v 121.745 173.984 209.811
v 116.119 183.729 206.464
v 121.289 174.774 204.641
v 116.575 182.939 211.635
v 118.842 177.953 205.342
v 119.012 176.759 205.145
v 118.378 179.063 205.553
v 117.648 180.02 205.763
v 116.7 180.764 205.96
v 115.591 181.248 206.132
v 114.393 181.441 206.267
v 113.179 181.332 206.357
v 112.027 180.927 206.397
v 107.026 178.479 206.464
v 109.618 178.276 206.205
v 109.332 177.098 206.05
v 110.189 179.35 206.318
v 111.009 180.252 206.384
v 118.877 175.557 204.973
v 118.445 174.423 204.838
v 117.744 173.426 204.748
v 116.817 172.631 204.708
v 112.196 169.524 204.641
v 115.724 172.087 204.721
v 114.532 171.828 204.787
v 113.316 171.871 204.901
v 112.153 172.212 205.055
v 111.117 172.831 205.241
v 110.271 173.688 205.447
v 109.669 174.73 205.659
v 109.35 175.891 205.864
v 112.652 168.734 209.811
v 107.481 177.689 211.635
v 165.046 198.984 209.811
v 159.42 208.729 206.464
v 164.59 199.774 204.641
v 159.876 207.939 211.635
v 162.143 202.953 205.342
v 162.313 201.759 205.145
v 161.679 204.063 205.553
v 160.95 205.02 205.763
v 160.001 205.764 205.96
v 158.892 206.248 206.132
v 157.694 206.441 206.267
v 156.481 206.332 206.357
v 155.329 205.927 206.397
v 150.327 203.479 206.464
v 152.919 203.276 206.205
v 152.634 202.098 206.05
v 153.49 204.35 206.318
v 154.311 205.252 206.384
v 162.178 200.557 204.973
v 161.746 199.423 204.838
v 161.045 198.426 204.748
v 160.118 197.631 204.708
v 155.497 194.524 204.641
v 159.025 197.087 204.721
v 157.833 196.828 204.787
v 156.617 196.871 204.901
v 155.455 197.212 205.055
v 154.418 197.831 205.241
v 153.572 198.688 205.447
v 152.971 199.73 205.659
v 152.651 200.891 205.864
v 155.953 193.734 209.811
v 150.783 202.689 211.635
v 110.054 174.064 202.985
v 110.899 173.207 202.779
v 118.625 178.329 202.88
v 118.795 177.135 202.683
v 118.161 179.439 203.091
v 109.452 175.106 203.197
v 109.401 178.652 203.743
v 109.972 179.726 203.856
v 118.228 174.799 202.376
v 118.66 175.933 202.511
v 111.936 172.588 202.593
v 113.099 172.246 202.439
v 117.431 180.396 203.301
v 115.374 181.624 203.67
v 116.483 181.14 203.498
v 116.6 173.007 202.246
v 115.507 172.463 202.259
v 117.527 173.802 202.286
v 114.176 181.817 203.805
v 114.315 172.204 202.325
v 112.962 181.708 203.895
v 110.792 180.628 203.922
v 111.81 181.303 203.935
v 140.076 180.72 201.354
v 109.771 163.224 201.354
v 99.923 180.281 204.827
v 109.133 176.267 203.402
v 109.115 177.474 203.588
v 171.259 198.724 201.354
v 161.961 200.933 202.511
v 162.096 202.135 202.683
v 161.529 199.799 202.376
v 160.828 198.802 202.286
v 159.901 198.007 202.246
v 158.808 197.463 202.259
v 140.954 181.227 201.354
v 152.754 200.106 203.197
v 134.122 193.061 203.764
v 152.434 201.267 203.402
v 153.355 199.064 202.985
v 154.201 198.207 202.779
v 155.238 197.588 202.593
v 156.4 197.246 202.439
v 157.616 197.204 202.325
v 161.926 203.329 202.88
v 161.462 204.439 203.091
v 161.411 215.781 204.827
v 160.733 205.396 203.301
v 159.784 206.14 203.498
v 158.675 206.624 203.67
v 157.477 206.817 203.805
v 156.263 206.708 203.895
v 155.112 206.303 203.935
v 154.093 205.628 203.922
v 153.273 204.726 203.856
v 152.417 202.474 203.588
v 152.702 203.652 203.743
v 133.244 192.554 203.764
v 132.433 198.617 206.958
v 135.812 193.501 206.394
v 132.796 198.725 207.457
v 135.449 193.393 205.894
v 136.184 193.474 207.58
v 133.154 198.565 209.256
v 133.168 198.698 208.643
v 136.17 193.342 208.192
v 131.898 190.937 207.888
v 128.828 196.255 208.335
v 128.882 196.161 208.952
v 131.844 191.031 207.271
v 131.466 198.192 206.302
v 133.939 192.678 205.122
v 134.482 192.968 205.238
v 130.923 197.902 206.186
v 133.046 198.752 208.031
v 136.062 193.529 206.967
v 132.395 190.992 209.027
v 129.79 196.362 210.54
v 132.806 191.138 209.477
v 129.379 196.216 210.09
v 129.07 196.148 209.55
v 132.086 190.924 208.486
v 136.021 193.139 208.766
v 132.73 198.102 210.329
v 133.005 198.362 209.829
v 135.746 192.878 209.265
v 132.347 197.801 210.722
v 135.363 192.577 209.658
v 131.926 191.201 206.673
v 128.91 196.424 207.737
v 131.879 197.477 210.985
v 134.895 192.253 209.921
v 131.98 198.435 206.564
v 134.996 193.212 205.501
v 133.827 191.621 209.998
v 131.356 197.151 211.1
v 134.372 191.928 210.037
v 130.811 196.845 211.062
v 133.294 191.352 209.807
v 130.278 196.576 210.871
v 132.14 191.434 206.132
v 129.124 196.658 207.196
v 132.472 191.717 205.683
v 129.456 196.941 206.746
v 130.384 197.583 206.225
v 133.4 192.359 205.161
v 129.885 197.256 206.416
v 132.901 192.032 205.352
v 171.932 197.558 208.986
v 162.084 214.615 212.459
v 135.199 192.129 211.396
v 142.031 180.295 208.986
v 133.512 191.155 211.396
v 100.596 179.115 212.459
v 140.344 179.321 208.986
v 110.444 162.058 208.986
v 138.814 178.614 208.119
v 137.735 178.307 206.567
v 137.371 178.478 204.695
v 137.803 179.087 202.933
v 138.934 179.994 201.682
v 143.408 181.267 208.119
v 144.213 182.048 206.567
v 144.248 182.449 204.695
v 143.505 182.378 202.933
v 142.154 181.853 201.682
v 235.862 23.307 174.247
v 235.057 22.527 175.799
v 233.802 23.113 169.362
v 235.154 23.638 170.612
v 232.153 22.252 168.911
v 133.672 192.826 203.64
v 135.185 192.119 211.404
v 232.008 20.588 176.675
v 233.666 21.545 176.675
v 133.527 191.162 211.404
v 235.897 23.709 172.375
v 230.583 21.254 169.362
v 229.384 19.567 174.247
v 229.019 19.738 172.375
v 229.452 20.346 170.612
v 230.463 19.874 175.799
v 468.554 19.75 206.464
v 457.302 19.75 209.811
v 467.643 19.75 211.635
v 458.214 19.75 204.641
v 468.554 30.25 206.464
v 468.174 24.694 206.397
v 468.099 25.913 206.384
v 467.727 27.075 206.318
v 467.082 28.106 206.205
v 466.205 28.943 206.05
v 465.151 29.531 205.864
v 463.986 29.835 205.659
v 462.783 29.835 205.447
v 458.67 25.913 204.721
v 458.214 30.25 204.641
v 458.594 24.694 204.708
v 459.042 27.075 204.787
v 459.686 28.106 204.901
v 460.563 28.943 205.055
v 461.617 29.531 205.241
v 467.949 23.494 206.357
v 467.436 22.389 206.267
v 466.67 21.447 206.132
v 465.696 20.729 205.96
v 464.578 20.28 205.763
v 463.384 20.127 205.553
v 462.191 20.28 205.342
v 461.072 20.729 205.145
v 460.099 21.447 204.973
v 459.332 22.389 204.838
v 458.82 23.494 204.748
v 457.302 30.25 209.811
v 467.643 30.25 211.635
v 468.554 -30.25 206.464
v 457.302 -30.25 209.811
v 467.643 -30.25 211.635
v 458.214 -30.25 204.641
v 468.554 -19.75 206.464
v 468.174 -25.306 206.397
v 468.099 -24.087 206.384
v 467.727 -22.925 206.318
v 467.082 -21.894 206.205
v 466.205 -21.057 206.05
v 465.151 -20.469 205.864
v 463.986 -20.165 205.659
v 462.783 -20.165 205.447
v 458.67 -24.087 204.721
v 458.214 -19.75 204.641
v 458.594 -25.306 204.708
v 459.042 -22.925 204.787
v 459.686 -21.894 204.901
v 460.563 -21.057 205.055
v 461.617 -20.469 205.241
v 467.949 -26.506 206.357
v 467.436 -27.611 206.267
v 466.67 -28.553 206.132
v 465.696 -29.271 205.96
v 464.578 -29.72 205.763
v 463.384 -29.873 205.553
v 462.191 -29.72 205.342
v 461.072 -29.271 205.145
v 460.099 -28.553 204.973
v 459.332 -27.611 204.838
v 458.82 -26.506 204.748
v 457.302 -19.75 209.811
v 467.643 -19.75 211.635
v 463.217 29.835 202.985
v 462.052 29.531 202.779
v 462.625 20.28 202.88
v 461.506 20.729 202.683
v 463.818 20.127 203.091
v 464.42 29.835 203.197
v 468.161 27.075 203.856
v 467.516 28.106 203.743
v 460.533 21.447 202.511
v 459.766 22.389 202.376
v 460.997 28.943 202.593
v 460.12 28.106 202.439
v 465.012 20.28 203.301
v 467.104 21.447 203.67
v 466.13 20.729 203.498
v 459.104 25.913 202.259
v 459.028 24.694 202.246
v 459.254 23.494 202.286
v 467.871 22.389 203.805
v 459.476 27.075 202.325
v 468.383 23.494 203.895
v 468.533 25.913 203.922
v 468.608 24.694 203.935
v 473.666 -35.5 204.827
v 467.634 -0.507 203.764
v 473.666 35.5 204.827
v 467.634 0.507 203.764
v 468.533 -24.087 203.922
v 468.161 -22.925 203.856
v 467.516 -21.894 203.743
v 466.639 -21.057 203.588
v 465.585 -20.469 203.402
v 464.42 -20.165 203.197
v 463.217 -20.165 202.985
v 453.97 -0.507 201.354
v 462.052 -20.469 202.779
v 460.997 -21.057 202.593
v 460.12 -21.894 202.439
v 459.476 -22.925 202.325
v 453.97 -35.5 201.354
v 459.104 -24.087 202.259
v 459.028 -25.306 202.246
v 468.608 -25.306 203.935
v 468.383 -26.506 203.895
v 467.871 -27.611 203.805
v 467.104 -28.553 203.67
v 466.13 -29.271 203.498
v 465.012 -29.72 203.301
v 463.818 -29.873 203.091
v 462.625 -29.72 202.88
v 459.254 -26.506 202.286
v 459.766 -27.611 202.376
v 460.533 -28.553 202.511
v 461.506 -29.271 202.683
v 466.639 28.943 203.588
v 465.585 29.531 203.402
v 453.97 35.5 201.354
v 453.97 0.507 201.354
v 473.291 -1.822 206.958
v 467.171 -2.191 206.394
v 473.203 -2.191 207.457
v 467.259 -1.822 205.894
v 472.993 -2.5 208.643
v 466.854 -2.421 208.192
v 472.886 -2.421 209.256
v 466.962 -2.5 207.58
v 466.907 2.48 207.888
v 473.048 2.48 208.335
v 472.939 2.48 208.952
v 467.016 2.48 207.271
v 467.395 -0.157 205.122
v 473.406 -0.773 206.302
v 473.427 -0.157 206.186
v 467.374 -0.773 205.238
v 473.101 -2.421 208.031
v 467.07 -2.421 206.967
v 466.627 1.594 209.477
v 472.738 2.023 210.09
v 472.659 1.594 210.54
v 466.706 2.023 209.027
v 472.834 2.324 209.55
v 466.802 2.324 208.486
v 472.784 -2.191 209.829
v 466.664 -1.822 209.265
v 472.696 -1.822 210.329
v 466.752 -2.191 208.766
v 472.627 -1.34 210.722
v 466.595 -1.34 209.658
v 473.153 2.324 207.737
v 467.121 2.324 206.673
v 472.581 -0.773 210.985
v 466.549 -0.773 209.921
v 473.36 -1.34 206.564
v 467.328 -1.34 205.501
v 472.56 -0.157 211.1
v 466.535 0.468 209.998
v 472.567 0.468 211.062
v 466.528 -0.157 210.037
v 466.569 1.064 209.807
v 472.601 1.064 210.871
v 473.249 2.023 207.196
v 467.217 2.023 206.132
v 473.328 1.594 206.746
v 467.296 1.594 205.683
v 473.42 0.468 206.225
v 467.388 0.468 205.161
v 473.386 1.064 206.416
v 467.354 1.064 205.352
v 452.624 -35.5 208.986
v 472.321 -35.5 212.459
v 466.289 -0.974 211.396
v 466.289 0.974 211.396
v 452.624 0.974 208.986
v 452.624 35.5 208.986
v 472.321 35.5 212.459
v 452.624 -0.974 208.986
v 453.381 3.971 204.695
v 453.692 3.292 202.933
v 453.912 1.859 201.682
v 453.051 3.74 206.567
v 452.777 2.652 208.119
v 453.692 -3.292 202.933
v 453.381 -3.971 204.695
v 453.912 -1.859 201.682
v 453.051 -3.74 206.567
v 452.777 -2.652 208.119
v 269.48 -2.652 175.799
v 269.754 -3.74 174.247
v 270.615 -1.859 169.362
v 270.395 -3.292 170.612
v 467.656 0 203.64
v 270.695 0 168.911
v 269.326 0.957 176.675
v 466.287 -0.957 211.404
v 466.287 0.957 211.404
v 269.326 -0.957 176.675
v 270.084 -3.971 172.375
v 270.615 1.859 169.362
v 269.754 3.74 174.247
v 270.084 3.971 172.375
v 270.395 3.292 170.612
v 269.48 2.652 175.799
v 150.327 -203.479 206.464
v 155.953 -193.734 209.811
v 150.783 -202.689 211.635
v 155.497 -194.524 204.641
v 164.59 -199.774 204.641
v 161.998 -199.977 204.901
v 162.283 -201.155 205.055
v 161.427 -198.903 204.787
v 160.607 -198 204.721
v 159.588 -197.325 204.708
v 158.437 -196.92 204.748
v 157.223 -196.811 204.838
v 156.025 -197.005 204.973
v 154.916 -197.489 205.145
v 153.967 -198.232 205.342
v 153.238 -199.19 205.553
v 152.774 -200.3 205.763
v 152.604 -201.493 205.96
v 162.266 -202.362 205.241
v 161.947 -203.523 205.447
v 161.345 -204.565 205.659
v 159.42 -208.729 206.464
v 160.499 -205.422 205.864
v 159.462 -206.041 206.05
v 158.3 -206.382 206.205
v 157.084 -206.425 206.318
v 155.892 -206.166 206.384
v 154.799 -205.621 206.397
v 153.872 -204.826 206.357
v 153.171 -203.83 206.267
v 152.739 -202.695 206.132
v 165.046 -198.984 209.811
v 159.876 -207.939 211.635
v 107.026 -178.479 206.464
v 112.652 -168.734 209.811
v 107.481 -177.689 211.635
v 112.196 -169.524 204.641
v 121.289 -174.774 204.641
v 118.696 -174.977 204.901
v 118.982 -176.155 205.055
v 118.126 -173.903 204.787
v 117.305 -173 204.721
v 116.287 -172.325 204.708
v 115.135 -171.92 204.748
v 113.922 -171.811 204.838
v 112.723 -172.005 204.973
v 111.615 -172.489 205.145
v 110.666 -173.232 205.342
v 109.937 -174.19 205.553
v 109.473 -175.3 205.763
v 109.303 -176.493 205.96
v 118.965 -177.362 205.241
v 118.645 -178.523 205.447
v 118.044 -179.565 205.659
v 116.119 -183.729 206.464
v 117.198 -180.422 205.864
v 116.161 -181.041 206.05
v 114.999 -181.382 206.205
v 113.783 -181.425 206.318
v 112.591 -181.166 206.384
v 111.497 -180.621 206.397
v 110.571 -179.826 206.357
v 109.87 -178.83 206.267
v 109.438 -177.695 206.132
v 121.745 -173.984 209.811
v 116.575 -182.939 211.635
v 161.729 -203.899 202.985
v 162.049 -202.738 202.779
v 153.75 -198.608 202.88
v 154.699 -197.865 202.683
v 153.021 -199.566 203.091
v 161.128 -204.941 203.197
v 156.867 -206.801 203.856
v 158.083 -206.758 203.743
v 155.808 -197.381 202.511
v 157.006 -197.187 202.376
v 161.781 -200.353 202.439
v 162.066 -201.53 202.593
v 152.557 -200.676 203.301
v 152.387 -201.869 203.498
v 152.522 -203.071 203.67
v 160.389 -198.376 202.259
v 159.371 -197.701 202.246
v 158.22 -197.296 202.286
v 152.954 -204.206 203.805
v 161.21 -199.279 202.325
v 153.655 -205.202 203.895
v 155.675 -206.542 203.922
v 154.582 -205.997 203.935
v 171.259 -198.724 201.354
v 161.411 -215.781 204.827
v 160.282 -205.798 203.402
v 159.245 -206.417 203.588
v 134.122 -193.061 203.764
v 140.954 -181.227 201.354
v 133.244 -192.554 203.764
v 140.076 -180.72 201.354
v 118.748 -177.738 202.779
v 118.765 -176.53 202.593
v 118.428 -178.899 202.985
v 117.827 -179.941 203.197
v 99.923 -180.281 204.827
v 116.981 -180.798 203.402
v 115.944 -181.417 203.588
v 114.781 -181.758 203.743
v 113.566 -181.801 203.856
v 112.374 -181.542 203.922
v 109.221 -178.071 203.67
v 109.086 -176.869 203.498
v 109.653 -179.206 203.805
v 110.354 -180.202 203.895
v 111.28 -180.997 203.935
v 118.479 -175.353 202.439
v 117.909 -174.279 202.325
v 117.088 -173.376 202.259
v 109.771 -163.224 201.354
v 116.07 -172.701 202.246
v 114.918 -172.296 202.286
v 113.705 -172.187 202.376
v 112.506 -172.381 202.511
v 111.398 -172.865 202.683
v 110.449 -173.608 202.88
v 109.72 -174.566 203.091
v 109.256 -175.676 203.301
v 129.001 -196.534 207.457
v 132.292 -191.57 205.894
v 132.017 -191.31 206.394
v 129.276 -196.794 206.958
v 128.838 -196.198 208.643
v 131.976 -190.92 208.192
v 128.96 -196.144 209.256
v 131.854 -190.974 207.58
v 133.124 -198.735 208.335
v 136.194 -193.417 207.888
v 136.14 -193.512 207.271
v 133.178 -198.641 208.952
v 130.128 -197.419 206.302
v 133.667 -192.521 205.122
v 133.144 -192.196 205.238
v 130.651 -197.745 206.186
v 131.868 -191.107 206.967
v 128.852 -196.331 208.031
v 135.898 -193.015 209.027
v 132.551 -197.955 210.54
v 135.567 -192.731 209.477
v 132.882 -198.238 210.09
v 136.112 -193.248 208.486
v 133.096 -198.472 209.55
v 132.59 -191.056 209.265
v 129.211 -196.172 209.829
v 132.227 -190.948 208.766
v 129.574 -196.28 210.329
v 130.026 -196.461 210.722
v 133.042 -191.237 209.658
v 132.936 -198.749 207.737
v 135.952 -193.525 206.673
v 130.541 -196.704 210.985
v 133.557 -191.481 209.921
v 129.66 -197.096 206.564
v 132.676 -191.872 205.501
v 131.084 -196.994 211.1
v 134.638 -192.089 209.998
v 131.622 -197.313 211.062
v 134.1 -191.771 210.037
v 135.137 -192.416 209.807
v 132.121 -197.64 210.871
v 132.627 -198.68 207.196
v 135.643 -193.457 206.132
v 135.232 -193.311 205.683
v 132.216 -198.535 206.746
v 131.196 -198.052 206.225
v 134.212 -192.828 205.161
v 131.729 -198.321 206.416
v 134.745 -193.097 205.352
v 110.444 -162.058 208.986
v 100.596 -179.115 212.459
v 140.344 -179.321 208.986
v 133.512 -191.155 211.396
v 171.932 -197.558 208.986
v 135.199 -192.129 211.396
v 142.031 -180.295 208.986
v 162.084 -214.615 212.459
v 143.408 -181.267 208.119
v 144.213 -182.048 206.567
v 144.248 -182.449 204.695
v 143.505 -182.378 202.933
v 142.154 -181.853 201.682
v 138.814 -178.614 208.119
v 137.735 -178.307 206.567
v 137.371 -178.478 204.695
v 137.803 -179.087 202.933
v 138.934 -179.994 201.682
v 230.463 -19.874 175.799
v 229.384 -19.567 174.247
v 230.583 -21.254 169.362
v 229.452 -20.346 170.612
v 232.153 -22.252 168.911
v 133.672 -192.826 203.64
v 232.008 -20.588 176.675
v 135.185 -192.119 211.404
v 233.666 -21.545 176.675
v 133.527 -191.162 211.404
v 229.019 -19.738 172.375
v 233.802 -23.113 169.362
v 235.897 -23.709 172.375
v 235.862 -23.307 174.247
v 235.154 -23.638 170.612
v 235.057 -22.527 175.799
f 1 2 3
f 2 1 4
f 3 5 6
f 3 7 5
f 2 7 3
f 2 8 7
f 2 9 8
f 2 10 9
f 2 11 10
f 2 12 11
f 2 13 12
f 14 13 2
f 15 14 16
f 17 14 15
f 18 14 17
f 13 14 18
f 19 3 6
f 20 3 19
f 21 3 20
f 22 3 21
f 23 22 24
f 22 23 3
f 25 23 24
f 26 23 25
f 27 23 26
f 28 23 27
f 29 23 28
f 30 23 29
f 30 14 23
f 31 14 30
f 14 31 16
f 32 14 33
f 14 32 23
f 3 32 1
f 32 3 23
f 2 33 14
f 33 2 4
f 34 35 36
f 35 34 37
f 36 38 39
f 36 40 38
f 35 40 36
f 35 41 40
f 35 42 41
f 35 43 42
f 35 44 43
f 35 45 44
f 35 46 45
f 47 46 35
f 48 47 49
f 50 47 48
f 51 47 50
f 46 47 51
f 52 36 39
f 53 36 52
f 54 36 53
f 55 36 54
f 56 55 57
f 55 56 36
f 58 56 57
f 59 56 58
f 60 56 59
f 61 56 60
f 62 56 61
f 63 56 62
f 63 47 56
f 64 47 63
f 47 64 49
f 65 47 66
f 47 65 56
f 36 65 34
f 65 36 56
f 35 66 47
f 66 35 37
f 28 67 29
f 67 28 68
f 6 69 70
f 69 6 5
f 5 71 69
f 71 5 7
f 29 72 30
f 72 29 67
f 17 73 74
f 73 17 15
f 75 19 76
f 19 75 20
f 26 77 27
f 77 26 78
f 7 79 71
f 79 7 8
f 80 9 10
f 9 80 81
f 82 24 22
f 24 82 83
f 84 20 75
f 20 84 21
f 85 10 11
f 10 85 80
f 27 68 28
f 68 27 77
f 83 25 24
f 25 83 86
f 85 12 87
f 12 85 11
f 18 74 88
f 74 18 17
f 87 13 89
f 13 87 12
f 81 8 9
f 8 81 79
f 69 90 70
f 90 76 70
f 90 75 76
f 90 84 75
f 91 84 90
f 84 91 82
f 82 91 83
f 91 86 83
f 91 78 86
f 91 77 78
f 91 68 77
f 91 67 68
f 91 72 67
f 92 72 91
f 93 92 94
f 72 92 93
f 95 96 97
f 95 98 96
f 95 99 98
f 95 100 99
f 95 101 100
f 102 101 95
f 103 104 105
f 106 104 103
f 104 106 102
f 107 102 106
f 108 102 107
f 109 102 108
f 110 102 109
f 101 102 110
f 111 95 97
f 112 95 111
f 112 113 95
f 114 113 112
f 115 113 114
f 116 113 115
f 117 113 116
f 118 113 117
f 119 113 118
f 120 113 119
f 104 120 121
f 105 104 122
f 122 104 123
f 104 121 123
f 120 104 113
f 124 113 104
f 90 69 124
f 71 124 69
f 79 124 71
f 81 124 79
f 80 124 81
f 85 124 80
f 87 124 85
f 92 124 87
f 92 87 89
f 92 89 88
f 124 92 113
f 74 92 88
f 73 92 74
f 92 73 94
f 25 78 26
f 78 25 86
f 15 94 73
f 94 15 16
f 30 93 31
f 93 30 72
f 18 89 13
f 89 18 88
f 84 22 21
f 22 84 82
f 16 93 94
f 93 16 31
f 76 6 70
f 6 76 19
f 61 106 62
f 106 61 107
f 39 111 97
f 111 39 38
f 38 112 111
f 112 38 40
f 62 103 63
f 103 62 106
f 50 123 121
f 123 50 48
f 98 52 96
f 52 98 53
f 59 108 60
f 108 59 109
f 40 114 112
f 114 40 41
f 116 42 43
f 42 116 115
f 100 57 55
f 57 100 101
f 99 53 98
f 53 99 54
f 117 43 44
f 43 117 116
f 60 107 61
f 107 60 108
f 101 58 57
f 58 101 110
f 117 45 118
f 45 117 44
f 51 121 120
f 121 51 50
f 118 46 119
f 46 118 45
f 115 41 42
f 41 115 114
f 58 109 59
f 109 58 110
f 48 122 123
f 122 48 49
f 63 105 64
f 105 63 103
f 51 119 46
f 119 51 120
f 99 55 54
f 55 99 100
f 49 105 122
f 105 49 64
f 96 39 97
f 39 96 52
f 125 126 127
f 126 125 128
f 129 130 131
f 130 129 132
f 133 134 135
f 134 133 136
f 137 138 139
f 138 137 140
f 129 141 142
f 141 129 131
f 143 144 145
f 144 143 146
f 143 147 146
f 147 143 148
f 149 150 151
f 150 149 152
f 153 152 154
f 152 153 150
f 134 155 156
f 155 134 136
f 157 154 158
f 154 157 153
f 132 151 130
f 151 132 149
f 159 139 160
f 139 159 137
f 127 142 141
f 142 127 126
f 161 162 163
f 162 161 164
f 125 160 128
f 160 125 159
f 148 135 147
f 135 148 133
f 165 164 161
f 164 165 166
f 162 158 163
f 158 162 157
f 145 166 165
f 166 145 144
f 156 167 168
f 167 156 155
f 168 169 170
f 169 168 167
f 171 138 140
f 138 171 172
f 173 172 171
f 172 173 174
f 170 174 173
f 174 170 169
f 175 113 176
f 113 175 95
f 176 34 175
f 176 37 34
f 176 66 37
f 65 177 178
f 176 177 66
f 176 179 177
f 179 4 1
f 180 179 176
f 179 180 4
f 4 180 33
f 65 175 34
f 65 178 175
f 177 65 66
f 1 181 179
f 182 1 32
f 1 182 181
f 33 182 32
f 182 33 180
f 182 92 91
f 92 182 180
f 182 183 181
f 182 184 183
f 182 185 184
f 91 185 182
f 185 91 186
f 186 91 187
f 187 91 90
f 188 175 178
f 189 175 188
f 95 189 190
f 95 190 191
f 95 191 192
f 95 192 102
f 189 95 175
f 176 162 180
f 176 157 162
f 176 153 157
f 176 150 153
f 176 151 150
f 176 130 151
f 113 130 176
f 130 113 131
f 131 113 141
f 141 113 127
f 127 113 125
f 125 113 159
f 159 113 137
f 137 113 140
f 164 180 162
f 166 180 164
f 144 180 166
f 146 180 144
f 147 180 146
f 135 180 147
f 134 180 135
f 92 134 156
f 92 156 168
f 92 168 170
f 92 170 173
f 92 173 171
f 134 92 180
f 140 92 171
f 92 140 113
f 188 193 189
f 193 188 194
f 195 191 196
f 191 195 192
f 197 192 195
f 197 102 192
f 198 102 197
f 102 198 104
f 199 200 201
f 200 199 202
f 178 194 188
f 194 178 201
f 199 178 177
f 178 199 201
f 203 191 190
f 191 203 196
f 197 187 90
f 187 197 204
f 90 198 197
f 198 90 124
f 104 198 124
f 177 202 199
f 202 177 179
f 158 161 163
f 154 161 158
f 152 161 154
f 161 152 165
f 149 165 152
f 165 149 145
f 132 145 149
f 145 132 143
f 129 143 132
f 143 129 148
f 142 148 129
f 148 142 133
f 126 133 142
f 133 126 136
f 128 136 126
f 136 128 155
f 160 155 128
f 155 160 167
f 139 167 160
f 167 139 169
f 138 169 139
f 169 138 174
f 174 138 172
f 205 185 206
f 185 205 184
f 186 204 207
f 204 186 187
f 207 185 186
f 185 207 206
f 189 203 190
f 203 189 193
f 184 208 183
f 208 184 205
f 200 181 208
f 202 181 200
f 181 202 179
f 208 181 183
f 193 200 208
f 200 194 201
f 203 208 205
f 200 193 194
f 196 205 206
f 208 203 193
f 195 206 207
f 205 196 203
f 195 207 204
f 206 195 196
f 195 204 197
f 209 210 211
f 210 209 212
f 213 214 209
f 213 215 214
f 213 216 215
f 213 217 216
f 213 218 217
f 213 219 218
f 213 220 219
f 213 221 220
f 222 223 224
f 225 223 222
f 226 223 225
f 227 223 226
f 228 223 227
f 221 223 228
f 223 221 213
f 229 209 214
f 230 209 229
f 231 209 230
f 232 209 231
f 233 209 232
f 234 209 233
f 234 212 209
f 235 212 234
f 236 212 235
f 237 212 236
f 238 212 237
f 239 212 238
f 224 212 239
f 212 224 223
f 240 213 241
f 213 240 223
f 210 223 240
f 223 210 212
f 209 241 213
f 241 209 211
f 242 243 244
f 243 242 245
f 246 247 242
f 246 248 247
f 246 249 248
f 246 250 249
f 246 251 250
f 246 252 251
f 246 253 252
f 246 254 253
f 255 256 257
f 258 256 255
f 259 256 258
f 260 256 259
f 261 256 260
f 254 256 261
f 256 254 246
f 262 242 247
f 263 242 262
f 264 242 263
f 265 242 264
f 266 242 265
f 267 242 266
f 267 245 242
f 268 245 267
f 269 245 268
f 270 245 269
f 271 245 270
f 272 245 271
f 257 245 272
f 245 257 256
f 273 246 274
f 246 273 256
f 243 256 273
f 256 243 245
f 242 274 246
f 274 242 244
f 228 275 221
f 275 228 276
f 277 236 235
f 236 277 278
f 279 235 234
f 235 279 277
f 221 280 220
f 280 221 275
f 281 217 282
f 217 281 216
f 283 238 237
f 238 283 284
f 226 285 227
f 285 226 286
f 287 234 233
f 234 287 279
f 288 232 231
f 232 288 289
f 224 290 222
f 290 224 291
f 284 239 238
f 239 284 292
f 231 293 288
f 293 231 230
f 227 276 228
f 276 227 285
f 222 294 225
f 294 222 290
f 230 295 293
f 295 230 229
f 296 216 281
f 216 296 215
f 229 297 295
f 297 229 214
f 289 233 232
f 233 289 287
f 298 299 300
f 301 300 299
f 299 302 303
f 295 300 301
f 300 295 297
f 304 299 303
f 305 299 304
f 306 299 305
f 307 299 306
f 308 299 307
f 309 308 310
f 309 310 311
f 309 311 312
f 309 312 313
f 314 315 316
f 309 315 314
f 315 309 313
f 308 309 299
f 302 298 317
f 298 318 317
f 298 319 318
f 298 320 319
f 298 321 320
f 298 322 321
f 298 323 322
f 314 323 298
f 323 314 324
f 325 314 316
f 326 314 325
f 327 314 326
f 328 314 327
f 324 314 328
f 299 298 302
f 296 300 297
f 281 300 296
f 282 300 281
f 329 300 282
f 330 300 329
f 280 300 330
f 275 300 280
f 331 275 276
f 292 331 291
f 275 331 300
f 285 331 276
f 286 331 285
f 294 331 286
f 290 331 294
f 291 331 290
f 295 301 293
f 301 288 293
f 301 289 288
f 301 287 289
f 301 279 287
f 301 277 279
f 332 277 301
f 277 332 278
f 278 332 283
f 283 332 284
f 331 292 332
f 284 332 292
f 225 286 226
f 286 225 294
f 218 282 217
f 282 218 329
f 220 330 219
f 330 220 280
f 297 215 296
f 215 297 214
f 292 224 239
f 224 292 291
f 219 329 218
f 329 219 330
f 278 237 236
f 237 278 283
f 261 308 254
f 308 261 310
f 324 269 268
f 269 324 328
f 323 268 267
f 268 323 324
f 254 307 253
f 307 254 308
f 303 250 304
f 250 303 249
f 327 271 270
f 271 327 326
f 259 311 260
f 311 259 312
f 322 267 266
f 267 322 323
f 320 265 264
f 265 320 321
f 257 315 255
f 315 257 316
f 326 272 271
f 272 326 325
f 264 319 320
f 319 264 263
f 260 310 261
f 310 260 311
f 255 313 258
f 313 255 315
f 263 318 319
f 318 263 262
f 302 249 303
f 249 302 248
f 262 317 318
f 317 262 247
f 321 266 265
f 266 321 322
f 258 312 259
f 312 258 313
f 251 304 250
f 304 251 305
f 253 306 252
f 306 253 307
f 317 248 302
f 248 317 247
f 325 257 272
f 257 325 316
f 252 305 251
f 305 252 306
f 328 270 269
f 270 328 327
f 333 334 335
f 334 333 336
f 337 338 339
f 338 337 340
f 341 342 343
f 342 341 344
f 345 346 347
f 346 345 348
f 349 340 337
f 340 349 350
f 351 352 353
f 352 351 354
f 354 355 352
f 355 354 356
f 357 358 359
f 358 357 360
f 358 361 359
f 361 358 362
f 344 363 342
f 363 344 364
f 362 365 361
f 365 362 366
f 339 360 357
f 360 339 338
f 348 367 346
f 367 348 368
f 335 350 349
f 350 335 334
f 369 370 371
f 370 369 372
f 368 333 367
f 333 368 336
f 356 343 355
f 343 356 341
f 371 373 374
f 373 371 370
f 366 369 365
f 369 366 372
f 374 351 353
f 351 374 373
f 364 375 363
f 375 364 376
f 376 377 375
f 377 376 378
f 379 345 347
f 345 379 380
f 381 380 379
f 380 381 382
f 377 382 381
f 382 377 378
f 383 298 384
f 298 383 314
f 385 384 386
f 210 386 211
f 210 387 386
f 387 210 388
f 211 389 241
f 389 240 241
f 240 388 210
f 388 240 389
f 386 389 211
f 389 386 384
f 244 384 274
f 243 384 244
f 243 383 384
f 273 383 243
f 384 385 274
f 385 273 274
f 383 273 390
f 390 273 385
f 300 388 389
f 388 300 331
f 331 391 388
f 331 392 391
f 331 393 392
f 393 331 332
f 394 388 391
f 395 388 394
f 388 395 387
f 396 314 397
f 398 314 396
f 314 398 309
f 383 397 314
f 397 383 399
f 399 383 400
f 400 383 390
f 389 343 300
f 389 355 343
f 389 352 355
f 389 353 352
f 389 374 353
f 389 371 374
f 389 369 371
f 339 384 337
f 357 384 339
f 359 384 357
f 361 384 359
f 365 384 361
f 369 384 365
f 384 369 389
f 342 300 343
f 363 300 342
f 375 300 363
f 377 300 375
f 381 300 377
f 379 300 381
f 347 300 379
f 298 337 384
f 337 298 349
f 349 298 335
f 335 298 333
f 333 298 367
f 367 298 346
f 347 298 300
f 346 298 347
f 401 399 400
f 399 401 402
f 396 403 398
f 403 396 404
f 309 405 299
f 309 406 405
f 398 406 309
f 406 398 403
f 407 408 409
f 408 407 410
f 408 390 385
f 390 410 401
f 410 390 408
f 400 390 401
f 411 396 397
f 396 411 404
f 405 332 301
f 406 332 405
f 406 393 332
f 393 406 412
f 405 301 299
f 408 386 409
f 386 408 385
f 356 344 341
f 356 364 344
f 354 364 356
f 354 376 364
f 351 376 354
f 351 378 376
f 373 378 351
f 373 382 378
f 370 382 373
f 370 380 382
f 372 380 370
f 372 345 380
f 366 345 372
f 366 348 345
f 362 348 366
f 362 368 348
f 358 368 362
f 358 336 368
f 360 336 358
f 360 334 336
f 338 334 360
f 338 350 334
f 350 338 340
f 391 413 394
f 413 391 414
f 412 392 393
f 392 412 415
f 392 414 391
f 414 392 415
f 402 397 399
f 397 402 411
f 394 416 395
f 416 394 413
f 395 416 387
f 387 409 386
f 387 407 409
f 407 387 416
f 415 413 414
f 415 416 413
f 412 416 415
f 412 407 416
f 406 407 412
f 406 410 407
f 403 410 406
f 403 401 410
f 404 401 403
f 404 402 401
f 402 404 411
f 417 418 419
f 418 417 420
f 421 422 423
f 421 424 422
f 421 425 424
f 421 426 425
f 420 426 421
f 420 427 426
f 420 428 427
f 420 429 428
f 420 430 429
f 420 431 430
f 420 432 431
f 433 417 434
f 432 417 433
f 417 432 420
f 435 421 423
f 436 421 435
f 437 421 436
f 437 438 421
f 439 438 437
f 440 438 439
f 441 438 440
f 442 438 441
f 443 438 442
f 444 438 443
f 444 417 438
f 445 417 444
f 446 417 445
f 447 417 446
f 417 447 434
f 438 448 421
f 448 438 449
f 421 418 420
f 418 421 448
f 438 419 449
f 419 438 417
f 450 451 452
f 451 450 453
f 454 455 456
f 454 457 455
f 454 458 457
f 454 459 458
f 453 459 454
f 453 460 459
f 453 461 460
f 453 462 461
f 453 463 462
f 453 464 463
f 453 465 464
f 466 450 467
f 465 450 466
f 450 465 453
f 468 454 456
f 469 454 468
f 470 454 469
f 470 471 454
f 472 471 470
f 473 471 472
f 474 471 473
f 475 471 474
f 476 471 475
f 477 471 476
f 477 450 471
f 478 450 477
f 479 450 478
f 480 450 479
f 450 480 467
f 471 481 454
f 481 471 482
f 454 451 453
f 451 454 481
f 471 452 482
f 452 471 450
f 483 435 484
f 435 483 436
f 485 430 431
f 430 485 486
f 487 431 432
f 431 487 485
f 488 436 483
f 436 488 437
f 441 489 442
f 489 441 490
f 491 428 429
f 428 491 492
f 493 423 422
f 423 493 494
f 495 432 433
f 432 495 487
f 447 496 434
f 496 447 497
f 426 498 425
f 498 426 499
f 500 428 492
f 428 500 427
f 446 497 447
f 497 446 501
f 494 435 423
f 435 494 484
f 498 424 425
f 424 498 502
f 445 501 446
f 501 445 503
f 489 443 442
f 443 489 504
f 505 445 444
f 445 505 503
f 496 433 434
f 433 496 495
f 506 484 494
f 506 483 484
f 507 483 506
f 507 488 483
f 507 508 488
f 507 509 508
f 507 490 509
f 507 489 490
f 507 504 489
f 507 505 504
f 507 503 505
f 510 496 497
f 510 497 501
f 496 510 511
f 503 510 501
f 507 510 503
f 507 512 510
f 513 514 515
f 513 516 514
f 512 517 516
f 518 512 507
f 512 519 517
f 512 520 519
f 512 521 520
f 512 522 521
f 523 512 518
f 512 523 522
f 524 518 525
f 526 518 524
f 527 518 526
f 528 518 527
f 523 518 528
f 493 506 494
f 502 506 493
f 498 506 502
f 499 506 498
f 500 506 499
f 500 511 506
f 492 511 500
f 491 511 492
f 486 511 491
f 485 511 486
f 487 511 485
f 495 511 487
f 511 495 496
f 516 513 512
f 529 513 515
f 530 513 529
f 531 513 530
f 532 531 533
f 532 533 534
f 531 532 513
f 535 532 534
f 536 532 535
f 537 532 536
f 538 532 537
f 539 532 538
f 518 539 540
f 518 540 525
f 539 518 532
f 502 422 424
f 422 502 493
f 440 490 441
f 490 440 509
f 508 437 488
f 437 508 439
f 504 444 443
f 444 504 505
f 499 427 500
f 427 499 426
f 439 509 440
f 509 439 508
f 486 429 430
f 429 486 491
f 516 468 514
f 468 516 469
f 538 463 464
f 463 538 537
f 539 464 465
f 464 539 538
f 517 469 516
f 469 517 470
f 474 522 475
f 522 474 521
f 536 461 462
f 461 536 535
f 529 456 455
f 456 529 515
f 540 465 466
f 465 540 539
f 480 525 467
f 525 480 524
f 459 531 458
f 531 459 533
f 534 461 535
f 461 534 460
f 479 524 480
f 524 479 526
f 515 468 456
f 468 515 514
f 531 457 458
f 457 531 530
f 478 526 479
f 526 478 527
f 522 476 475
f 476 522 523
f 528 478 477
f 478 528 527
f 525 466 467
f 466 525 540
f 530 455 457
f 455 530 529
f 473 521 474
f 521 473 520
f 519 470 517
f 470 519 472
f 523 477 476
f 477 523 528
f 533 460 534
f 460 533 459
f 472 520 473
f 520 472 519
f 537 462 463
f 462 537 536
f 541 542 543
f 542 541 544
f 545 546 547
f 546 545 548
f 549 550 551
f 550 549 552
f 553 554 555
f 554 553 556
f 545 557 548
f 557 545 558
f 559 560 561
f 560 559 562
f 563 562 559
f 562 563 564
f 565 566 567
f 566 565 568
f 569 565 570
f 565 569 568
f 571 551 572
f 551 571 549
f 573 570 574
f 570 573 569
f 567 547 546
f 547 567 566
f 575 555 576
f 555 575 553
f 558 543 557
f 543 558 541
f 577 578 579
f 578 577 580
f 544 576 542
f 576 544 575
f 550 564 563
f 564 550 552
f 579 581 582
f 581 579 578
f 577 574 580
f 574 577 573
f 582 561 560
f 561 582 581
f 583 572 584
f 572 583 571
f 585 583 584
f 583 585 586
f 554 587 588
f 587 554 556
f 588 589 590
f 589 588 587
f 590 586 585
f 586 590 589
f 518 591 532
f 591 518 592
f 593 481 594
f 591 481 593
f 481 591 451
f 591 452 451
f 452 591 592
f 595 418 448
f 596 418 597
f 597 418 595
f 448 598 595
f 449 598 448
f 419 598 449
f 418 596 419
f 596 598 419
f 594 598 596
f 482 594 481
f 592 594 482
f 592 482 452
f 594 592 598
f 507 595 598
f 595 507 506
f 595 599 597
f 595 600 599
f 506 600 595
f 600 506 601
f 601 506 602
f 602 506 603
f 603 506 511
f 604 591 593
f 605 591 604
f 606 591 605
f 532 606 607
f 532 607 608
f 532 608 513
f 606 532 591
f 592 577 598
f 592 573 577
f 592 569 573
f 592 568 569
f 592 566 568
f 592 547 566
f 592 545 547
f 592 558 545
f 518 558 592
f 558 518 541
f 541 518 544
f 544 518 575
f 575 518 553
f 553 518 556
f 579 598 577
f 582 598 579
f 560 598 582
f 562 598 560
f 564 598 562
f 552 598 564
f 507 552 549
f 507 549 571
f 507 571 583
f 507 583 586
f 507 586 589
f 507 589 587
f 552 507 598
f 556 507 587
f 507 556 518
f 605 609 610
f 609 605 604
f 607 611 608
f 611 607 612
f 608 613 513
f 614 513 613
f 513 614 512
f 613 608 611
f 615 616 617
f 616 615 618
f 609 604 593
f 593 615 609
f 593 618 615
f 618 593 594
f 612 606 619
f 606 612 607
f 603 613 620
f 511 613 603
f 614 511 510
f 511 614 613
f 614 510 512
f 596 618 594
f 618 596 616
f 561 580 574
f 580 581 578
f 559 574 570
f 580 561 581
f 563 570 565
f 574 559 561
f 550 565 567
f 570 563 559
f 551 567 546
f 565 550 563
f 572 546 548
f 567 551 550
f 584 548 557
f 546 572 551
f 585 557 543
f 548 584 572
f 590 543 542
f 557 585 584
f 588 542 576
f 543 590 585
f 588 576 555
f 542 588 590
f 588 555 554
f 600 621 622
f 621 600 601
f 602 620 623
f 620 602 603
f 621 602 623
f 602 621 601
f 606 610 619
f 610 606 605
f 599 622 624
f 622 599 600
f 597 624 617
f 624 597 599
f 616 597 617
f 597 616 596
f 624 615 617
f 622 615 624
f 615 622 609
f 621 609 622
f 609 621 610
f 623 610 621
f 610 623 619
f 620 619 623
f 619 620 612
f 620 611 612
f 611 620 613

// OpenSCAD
// file: variables.scad
// Pinya3 3D Food Printer
// file: variables.scad 
// author: Luis Rodriguez
// version: 0.1
// w3b: 3digitalcooks.com 

// Variables for all the project
// just numbers??
alpha = 0.7;

// FRAME 
frame_alpha = alpha;
frame_profile_width = 20;

frame_height = 410;
frame_width = 200;  // 250mm -> 7capsules~de 8cm
frame_lenght = 200;

// PRINTING AREA
// from: https://www.marginallyclever.com/other/samples/fk-ik-test.html
// Base radius (f) = 80mm
// End Effector radius (e) = 30mm
// Bice length (rf) = 200mm
// Forearm length = 260mm
// PA = 260 x 260 x 260
// X=-128.225 to 128.225 mm 
// Y=-128.225 to 128.225 mm
// Z=-387.23 to -130.781 mm
printing_area_alpha = 0.1;
printing_area_x = 128*2;//195*2;
printing_area_y = 128*2;//195*2;
printing_area_distance_from_motors_base = 130;//151
printing_area_z_max = 387;
printing_area_z = printing_area_z_max - printing_area_distance_from_motors_base;//540-151;
echo("printing z =",printing_area_z);
printing_area_x_displacement = frame_width/2 + printing_area_x/2 + 17;
echo("printing area x displecement", printing_area_x_displacement);

// FOREARM 
forearm_alpha = alpha;
forearm_length = 260;
forearm_rad = 4;
forearm_motors_joint_rad = 25;
forearm_ball_diameter = 12;
forearm_bicep_joint_degree = 150;

// BICEP
bicep_length = 200;
bicep_rad = forearm_rad;
bicep_motors_joint_rad = forearm_motors_joint_rad;
bicep_motors_joint_degree = 100;

// MOTORS BASE
motors_base_alpha = alpha;
motors_base_thickness = 6;
motors_base_rad = forearm_motors_joint_rad;

stepper_bracket_base_thickness = 5;
stepper_motor_width = 42.3;

// DELTA BEAM
delta_beam_alpha = alpha;
delta_beam_length = printing_area_x_displacement 
                    + forearm_motors_joint_rad 
                    + frame_width/2;
echo("Delta beam lenght = ", delta_beam_length);
delta_beam_profile_width = frame_profile_width*3; //60cm
delta_beam_under_frame = 0; // 1 = Beam under frame or 0 = Beam on frame
delta_beam_bolt_rad = 4;
delta_beam_distance_btw_slots = 20;


// CAROUSEL
carousel_alpha = 0.3;
carousel_number_of_tools = 11;
carousel_offset_rotation = 0; // in degrees
carousel_rad = frame_width-20;//160;
carousel_tool_height = 180;
carousel_tool_rad = 40;

// GEARED STEPPER
stepper_shaft_diameter = 8;

// MOTOR BICEP JOINT
motor_bicep_joint_shaft_holder_diameter = 21;
motor_bicep_joint_shaft_holder_thickness = 12;

motor_bicep_joint_bicep_holder_width = motor_bicep_joint_shaft_holder_thickness;
motor_bicep_joint_bicep_holder_length = 20 + motor_bicep_joint_shaft_holder_diameter/2;

motor_bicep_joint_bicep_insert_lenght = 20;

motor_bicep_joint_shaft_bolt_lenght = 12;
motor_bicep_joint_shaft_bolt_diameter = 3.25;

motor_bicep_joint_bicep_bolt_diameter = motor_bicep_joint_shaft_bolt_diameter;
motor_bicep_joint_bicep_bolt_lenght = 30;

motor_bicep_joint_shaft_nut_thickness = 3;
motor_bicep_joint_shaft_nut_width = 6.2;
motor_bicep_joint_shaft_nut_hole_height = 30;
motor_bicep_joint_shaft_nut_displacement = stepper_shaft_diameter/3 + 
            (motor_bicep_joint_shaft_holder_diameter/2 - stepper_shaft_diameter/2)/2;
motor_bicep_joint_bicep_nut_diameter = 6.5;
motor_bicep_joint_bicep_nut_thickness = motor_bicep_joint_shaft_nut_thickness;

motor_bicep_joint_shaft_flat_displecement = -4.6;
// BICEP
bicep_diameter = 8;

// MAGNET
magnet_clearance = 0.5;
magnet_cube_side = magnet_clearance + 10;

// BICEP FOREARM JOINT
bfj_distance_btw_forearms = 50;
bfj_width = bfj_distance_btw_forearms + 2*magnet_cube_side;
bfj_thickness = 20;
bfj_forearms_joint_ball_sliding_height = 2.5;
bfj_height = magnet_cube_side/2 + bfj_forearms_joint_ball_sliding_height;
bfj_screw_diameter = 5;

// bfj_ball_sliding_rad calculation
R = forearm_ball_diameter/2;
r = bfj_forearms_joint_ball_sliding_height;
r_prima = R - r;
echo("r_prima", r_prima);
cosx = r_prima/R;
x = acos(cosx);
echo("x", x);
bfj_ball_sliding_rad = R*sin(x);
echo(bfj_ball_sliding_rad);

// END EFFECTOR
ef_rad =  66;
ef_distance_btw_forearms = bfj_distance_btw_forearms;
ef_side_width = bfj_distance_btw_forearms + 20;
ef_magnet_hole_edge_offset = magnet_cube_side/2 + 2;

ef_blocking_hole_diameter = 3.33;
ef_blocking_hole_pos_diameter = 25;

ef_cutted_corners_pos_diameter = 35;

ef_tool_ole_rad = 21;

print_offset = 0.33;

magnet_rad = 8/2 + print_offset;
magnet_position_rad = 20;
magnet_height = 6 + print_offset;

ef_ball_sliding_magnet_clearance = bfj_forearms_joint_ball_sliding_height;
ef_ball_sliding_rad = bfj_ball_sliding_rad;

ef_thickness = 5.5 + ef_ball_sliding_magnet_clearance;
echo(ef_thickness);
// file: bicep_forearm_joint.scad
// Pinya3 3D Food Printer
// file: bicep_forearm_joint.scad 
// author: Luis Rodriguez
// version: 0.1
// w3b: 3digitalcooks.com

include <variables.scad>

module bicep_forearm_joints() {
  bicep_forearm_joint();
}

bicep_forearm_joint();

module bicep_forearm_joint(){
  difference(){
    union(){ // Add
        bfj_body();
    }
    union(){ // Substract
        bfj_magnets_holes();
        bfj_bicep_screw_hole();
        bfj_forearms_joint_ball_sliding_holes();
    }
  }
}

// ADD
module bfj_body() {
  cube([bfj_width, 
        bfj_thickness, 
        bfj_height], center=true);
}

// SUBSTRACT
module bfj_magnets_holes() {
  for (i = [-1,1]) {
    translate([i*bfj_distance_btw_forearms/2, 
               0, 
               bfj_height/2])
      cube([magnet_cube_side, 
            magnet_cube_side, 
            magnet_cube_side], center=true);
  }
}

module bfj_bicep_screw_hole() {
  rotate([90, 0, 0])
  cylinder(h = bfj_height*3, r = bfj_screw_diameter/2, center=true, $fn = 25);
}

module bfj_forearms_joint_ball_sliding_holes() {
  #for (i = [-1,1]) {
    translate([i*bfj_distance_btw_forearms/2, 
               0, 
               -bfj_height/2 + bfj_forearms_joint_ball_sliding_height/2])
      cylinder( h = bfj_forearms_joint_ball_sliding_height, 
                r = bfj_ball_sliding_rad, center=true, $fn = 25);
  }
}
// main file
// Pinya3 3D Food Printer
// file: biceps.scad 
// author: Luis Rodriguez
// version: 0.1
// w3b: 3digitalcooks.com

use <bicep_forearm_joint.scad>
include <variables.scad>

biceps();

module biceps(){
  difference(){
    union(){ // Add
      bicep();
    }
    union(){ // Substract
    }
  }
}

module bicep() {
      color("OrangeRed", forearm_alpha)
      for (i = [0,1,2]) {
        translate([printing_area_x_displacement + bicep_motors_joint_rad*sin(i*120 -30), 
                   bicep_motors_joint_rad*cos(i*120 -30),                  
                   frame_height/2
                   //+ bicep_length/2
                   - delta_beam_under_frame * frame_profile_width * 2
                   - motors_base_thickness
                   - stepper_bracket_base_thickness
                   - stepper_motor_width/2])
        rotate([0, bicep_motors_joint_degree, 120*i +120*i - 60])
          mirror([0, 0, 1]){
            cylinder(h = bicep_length, r = bicep_rad, center=false);
            translate([0, 0, bicep_length - bfj_height/2])
              rotate([270, 0, 90])
              bicep_forearm_joint();
          }
      }
}
